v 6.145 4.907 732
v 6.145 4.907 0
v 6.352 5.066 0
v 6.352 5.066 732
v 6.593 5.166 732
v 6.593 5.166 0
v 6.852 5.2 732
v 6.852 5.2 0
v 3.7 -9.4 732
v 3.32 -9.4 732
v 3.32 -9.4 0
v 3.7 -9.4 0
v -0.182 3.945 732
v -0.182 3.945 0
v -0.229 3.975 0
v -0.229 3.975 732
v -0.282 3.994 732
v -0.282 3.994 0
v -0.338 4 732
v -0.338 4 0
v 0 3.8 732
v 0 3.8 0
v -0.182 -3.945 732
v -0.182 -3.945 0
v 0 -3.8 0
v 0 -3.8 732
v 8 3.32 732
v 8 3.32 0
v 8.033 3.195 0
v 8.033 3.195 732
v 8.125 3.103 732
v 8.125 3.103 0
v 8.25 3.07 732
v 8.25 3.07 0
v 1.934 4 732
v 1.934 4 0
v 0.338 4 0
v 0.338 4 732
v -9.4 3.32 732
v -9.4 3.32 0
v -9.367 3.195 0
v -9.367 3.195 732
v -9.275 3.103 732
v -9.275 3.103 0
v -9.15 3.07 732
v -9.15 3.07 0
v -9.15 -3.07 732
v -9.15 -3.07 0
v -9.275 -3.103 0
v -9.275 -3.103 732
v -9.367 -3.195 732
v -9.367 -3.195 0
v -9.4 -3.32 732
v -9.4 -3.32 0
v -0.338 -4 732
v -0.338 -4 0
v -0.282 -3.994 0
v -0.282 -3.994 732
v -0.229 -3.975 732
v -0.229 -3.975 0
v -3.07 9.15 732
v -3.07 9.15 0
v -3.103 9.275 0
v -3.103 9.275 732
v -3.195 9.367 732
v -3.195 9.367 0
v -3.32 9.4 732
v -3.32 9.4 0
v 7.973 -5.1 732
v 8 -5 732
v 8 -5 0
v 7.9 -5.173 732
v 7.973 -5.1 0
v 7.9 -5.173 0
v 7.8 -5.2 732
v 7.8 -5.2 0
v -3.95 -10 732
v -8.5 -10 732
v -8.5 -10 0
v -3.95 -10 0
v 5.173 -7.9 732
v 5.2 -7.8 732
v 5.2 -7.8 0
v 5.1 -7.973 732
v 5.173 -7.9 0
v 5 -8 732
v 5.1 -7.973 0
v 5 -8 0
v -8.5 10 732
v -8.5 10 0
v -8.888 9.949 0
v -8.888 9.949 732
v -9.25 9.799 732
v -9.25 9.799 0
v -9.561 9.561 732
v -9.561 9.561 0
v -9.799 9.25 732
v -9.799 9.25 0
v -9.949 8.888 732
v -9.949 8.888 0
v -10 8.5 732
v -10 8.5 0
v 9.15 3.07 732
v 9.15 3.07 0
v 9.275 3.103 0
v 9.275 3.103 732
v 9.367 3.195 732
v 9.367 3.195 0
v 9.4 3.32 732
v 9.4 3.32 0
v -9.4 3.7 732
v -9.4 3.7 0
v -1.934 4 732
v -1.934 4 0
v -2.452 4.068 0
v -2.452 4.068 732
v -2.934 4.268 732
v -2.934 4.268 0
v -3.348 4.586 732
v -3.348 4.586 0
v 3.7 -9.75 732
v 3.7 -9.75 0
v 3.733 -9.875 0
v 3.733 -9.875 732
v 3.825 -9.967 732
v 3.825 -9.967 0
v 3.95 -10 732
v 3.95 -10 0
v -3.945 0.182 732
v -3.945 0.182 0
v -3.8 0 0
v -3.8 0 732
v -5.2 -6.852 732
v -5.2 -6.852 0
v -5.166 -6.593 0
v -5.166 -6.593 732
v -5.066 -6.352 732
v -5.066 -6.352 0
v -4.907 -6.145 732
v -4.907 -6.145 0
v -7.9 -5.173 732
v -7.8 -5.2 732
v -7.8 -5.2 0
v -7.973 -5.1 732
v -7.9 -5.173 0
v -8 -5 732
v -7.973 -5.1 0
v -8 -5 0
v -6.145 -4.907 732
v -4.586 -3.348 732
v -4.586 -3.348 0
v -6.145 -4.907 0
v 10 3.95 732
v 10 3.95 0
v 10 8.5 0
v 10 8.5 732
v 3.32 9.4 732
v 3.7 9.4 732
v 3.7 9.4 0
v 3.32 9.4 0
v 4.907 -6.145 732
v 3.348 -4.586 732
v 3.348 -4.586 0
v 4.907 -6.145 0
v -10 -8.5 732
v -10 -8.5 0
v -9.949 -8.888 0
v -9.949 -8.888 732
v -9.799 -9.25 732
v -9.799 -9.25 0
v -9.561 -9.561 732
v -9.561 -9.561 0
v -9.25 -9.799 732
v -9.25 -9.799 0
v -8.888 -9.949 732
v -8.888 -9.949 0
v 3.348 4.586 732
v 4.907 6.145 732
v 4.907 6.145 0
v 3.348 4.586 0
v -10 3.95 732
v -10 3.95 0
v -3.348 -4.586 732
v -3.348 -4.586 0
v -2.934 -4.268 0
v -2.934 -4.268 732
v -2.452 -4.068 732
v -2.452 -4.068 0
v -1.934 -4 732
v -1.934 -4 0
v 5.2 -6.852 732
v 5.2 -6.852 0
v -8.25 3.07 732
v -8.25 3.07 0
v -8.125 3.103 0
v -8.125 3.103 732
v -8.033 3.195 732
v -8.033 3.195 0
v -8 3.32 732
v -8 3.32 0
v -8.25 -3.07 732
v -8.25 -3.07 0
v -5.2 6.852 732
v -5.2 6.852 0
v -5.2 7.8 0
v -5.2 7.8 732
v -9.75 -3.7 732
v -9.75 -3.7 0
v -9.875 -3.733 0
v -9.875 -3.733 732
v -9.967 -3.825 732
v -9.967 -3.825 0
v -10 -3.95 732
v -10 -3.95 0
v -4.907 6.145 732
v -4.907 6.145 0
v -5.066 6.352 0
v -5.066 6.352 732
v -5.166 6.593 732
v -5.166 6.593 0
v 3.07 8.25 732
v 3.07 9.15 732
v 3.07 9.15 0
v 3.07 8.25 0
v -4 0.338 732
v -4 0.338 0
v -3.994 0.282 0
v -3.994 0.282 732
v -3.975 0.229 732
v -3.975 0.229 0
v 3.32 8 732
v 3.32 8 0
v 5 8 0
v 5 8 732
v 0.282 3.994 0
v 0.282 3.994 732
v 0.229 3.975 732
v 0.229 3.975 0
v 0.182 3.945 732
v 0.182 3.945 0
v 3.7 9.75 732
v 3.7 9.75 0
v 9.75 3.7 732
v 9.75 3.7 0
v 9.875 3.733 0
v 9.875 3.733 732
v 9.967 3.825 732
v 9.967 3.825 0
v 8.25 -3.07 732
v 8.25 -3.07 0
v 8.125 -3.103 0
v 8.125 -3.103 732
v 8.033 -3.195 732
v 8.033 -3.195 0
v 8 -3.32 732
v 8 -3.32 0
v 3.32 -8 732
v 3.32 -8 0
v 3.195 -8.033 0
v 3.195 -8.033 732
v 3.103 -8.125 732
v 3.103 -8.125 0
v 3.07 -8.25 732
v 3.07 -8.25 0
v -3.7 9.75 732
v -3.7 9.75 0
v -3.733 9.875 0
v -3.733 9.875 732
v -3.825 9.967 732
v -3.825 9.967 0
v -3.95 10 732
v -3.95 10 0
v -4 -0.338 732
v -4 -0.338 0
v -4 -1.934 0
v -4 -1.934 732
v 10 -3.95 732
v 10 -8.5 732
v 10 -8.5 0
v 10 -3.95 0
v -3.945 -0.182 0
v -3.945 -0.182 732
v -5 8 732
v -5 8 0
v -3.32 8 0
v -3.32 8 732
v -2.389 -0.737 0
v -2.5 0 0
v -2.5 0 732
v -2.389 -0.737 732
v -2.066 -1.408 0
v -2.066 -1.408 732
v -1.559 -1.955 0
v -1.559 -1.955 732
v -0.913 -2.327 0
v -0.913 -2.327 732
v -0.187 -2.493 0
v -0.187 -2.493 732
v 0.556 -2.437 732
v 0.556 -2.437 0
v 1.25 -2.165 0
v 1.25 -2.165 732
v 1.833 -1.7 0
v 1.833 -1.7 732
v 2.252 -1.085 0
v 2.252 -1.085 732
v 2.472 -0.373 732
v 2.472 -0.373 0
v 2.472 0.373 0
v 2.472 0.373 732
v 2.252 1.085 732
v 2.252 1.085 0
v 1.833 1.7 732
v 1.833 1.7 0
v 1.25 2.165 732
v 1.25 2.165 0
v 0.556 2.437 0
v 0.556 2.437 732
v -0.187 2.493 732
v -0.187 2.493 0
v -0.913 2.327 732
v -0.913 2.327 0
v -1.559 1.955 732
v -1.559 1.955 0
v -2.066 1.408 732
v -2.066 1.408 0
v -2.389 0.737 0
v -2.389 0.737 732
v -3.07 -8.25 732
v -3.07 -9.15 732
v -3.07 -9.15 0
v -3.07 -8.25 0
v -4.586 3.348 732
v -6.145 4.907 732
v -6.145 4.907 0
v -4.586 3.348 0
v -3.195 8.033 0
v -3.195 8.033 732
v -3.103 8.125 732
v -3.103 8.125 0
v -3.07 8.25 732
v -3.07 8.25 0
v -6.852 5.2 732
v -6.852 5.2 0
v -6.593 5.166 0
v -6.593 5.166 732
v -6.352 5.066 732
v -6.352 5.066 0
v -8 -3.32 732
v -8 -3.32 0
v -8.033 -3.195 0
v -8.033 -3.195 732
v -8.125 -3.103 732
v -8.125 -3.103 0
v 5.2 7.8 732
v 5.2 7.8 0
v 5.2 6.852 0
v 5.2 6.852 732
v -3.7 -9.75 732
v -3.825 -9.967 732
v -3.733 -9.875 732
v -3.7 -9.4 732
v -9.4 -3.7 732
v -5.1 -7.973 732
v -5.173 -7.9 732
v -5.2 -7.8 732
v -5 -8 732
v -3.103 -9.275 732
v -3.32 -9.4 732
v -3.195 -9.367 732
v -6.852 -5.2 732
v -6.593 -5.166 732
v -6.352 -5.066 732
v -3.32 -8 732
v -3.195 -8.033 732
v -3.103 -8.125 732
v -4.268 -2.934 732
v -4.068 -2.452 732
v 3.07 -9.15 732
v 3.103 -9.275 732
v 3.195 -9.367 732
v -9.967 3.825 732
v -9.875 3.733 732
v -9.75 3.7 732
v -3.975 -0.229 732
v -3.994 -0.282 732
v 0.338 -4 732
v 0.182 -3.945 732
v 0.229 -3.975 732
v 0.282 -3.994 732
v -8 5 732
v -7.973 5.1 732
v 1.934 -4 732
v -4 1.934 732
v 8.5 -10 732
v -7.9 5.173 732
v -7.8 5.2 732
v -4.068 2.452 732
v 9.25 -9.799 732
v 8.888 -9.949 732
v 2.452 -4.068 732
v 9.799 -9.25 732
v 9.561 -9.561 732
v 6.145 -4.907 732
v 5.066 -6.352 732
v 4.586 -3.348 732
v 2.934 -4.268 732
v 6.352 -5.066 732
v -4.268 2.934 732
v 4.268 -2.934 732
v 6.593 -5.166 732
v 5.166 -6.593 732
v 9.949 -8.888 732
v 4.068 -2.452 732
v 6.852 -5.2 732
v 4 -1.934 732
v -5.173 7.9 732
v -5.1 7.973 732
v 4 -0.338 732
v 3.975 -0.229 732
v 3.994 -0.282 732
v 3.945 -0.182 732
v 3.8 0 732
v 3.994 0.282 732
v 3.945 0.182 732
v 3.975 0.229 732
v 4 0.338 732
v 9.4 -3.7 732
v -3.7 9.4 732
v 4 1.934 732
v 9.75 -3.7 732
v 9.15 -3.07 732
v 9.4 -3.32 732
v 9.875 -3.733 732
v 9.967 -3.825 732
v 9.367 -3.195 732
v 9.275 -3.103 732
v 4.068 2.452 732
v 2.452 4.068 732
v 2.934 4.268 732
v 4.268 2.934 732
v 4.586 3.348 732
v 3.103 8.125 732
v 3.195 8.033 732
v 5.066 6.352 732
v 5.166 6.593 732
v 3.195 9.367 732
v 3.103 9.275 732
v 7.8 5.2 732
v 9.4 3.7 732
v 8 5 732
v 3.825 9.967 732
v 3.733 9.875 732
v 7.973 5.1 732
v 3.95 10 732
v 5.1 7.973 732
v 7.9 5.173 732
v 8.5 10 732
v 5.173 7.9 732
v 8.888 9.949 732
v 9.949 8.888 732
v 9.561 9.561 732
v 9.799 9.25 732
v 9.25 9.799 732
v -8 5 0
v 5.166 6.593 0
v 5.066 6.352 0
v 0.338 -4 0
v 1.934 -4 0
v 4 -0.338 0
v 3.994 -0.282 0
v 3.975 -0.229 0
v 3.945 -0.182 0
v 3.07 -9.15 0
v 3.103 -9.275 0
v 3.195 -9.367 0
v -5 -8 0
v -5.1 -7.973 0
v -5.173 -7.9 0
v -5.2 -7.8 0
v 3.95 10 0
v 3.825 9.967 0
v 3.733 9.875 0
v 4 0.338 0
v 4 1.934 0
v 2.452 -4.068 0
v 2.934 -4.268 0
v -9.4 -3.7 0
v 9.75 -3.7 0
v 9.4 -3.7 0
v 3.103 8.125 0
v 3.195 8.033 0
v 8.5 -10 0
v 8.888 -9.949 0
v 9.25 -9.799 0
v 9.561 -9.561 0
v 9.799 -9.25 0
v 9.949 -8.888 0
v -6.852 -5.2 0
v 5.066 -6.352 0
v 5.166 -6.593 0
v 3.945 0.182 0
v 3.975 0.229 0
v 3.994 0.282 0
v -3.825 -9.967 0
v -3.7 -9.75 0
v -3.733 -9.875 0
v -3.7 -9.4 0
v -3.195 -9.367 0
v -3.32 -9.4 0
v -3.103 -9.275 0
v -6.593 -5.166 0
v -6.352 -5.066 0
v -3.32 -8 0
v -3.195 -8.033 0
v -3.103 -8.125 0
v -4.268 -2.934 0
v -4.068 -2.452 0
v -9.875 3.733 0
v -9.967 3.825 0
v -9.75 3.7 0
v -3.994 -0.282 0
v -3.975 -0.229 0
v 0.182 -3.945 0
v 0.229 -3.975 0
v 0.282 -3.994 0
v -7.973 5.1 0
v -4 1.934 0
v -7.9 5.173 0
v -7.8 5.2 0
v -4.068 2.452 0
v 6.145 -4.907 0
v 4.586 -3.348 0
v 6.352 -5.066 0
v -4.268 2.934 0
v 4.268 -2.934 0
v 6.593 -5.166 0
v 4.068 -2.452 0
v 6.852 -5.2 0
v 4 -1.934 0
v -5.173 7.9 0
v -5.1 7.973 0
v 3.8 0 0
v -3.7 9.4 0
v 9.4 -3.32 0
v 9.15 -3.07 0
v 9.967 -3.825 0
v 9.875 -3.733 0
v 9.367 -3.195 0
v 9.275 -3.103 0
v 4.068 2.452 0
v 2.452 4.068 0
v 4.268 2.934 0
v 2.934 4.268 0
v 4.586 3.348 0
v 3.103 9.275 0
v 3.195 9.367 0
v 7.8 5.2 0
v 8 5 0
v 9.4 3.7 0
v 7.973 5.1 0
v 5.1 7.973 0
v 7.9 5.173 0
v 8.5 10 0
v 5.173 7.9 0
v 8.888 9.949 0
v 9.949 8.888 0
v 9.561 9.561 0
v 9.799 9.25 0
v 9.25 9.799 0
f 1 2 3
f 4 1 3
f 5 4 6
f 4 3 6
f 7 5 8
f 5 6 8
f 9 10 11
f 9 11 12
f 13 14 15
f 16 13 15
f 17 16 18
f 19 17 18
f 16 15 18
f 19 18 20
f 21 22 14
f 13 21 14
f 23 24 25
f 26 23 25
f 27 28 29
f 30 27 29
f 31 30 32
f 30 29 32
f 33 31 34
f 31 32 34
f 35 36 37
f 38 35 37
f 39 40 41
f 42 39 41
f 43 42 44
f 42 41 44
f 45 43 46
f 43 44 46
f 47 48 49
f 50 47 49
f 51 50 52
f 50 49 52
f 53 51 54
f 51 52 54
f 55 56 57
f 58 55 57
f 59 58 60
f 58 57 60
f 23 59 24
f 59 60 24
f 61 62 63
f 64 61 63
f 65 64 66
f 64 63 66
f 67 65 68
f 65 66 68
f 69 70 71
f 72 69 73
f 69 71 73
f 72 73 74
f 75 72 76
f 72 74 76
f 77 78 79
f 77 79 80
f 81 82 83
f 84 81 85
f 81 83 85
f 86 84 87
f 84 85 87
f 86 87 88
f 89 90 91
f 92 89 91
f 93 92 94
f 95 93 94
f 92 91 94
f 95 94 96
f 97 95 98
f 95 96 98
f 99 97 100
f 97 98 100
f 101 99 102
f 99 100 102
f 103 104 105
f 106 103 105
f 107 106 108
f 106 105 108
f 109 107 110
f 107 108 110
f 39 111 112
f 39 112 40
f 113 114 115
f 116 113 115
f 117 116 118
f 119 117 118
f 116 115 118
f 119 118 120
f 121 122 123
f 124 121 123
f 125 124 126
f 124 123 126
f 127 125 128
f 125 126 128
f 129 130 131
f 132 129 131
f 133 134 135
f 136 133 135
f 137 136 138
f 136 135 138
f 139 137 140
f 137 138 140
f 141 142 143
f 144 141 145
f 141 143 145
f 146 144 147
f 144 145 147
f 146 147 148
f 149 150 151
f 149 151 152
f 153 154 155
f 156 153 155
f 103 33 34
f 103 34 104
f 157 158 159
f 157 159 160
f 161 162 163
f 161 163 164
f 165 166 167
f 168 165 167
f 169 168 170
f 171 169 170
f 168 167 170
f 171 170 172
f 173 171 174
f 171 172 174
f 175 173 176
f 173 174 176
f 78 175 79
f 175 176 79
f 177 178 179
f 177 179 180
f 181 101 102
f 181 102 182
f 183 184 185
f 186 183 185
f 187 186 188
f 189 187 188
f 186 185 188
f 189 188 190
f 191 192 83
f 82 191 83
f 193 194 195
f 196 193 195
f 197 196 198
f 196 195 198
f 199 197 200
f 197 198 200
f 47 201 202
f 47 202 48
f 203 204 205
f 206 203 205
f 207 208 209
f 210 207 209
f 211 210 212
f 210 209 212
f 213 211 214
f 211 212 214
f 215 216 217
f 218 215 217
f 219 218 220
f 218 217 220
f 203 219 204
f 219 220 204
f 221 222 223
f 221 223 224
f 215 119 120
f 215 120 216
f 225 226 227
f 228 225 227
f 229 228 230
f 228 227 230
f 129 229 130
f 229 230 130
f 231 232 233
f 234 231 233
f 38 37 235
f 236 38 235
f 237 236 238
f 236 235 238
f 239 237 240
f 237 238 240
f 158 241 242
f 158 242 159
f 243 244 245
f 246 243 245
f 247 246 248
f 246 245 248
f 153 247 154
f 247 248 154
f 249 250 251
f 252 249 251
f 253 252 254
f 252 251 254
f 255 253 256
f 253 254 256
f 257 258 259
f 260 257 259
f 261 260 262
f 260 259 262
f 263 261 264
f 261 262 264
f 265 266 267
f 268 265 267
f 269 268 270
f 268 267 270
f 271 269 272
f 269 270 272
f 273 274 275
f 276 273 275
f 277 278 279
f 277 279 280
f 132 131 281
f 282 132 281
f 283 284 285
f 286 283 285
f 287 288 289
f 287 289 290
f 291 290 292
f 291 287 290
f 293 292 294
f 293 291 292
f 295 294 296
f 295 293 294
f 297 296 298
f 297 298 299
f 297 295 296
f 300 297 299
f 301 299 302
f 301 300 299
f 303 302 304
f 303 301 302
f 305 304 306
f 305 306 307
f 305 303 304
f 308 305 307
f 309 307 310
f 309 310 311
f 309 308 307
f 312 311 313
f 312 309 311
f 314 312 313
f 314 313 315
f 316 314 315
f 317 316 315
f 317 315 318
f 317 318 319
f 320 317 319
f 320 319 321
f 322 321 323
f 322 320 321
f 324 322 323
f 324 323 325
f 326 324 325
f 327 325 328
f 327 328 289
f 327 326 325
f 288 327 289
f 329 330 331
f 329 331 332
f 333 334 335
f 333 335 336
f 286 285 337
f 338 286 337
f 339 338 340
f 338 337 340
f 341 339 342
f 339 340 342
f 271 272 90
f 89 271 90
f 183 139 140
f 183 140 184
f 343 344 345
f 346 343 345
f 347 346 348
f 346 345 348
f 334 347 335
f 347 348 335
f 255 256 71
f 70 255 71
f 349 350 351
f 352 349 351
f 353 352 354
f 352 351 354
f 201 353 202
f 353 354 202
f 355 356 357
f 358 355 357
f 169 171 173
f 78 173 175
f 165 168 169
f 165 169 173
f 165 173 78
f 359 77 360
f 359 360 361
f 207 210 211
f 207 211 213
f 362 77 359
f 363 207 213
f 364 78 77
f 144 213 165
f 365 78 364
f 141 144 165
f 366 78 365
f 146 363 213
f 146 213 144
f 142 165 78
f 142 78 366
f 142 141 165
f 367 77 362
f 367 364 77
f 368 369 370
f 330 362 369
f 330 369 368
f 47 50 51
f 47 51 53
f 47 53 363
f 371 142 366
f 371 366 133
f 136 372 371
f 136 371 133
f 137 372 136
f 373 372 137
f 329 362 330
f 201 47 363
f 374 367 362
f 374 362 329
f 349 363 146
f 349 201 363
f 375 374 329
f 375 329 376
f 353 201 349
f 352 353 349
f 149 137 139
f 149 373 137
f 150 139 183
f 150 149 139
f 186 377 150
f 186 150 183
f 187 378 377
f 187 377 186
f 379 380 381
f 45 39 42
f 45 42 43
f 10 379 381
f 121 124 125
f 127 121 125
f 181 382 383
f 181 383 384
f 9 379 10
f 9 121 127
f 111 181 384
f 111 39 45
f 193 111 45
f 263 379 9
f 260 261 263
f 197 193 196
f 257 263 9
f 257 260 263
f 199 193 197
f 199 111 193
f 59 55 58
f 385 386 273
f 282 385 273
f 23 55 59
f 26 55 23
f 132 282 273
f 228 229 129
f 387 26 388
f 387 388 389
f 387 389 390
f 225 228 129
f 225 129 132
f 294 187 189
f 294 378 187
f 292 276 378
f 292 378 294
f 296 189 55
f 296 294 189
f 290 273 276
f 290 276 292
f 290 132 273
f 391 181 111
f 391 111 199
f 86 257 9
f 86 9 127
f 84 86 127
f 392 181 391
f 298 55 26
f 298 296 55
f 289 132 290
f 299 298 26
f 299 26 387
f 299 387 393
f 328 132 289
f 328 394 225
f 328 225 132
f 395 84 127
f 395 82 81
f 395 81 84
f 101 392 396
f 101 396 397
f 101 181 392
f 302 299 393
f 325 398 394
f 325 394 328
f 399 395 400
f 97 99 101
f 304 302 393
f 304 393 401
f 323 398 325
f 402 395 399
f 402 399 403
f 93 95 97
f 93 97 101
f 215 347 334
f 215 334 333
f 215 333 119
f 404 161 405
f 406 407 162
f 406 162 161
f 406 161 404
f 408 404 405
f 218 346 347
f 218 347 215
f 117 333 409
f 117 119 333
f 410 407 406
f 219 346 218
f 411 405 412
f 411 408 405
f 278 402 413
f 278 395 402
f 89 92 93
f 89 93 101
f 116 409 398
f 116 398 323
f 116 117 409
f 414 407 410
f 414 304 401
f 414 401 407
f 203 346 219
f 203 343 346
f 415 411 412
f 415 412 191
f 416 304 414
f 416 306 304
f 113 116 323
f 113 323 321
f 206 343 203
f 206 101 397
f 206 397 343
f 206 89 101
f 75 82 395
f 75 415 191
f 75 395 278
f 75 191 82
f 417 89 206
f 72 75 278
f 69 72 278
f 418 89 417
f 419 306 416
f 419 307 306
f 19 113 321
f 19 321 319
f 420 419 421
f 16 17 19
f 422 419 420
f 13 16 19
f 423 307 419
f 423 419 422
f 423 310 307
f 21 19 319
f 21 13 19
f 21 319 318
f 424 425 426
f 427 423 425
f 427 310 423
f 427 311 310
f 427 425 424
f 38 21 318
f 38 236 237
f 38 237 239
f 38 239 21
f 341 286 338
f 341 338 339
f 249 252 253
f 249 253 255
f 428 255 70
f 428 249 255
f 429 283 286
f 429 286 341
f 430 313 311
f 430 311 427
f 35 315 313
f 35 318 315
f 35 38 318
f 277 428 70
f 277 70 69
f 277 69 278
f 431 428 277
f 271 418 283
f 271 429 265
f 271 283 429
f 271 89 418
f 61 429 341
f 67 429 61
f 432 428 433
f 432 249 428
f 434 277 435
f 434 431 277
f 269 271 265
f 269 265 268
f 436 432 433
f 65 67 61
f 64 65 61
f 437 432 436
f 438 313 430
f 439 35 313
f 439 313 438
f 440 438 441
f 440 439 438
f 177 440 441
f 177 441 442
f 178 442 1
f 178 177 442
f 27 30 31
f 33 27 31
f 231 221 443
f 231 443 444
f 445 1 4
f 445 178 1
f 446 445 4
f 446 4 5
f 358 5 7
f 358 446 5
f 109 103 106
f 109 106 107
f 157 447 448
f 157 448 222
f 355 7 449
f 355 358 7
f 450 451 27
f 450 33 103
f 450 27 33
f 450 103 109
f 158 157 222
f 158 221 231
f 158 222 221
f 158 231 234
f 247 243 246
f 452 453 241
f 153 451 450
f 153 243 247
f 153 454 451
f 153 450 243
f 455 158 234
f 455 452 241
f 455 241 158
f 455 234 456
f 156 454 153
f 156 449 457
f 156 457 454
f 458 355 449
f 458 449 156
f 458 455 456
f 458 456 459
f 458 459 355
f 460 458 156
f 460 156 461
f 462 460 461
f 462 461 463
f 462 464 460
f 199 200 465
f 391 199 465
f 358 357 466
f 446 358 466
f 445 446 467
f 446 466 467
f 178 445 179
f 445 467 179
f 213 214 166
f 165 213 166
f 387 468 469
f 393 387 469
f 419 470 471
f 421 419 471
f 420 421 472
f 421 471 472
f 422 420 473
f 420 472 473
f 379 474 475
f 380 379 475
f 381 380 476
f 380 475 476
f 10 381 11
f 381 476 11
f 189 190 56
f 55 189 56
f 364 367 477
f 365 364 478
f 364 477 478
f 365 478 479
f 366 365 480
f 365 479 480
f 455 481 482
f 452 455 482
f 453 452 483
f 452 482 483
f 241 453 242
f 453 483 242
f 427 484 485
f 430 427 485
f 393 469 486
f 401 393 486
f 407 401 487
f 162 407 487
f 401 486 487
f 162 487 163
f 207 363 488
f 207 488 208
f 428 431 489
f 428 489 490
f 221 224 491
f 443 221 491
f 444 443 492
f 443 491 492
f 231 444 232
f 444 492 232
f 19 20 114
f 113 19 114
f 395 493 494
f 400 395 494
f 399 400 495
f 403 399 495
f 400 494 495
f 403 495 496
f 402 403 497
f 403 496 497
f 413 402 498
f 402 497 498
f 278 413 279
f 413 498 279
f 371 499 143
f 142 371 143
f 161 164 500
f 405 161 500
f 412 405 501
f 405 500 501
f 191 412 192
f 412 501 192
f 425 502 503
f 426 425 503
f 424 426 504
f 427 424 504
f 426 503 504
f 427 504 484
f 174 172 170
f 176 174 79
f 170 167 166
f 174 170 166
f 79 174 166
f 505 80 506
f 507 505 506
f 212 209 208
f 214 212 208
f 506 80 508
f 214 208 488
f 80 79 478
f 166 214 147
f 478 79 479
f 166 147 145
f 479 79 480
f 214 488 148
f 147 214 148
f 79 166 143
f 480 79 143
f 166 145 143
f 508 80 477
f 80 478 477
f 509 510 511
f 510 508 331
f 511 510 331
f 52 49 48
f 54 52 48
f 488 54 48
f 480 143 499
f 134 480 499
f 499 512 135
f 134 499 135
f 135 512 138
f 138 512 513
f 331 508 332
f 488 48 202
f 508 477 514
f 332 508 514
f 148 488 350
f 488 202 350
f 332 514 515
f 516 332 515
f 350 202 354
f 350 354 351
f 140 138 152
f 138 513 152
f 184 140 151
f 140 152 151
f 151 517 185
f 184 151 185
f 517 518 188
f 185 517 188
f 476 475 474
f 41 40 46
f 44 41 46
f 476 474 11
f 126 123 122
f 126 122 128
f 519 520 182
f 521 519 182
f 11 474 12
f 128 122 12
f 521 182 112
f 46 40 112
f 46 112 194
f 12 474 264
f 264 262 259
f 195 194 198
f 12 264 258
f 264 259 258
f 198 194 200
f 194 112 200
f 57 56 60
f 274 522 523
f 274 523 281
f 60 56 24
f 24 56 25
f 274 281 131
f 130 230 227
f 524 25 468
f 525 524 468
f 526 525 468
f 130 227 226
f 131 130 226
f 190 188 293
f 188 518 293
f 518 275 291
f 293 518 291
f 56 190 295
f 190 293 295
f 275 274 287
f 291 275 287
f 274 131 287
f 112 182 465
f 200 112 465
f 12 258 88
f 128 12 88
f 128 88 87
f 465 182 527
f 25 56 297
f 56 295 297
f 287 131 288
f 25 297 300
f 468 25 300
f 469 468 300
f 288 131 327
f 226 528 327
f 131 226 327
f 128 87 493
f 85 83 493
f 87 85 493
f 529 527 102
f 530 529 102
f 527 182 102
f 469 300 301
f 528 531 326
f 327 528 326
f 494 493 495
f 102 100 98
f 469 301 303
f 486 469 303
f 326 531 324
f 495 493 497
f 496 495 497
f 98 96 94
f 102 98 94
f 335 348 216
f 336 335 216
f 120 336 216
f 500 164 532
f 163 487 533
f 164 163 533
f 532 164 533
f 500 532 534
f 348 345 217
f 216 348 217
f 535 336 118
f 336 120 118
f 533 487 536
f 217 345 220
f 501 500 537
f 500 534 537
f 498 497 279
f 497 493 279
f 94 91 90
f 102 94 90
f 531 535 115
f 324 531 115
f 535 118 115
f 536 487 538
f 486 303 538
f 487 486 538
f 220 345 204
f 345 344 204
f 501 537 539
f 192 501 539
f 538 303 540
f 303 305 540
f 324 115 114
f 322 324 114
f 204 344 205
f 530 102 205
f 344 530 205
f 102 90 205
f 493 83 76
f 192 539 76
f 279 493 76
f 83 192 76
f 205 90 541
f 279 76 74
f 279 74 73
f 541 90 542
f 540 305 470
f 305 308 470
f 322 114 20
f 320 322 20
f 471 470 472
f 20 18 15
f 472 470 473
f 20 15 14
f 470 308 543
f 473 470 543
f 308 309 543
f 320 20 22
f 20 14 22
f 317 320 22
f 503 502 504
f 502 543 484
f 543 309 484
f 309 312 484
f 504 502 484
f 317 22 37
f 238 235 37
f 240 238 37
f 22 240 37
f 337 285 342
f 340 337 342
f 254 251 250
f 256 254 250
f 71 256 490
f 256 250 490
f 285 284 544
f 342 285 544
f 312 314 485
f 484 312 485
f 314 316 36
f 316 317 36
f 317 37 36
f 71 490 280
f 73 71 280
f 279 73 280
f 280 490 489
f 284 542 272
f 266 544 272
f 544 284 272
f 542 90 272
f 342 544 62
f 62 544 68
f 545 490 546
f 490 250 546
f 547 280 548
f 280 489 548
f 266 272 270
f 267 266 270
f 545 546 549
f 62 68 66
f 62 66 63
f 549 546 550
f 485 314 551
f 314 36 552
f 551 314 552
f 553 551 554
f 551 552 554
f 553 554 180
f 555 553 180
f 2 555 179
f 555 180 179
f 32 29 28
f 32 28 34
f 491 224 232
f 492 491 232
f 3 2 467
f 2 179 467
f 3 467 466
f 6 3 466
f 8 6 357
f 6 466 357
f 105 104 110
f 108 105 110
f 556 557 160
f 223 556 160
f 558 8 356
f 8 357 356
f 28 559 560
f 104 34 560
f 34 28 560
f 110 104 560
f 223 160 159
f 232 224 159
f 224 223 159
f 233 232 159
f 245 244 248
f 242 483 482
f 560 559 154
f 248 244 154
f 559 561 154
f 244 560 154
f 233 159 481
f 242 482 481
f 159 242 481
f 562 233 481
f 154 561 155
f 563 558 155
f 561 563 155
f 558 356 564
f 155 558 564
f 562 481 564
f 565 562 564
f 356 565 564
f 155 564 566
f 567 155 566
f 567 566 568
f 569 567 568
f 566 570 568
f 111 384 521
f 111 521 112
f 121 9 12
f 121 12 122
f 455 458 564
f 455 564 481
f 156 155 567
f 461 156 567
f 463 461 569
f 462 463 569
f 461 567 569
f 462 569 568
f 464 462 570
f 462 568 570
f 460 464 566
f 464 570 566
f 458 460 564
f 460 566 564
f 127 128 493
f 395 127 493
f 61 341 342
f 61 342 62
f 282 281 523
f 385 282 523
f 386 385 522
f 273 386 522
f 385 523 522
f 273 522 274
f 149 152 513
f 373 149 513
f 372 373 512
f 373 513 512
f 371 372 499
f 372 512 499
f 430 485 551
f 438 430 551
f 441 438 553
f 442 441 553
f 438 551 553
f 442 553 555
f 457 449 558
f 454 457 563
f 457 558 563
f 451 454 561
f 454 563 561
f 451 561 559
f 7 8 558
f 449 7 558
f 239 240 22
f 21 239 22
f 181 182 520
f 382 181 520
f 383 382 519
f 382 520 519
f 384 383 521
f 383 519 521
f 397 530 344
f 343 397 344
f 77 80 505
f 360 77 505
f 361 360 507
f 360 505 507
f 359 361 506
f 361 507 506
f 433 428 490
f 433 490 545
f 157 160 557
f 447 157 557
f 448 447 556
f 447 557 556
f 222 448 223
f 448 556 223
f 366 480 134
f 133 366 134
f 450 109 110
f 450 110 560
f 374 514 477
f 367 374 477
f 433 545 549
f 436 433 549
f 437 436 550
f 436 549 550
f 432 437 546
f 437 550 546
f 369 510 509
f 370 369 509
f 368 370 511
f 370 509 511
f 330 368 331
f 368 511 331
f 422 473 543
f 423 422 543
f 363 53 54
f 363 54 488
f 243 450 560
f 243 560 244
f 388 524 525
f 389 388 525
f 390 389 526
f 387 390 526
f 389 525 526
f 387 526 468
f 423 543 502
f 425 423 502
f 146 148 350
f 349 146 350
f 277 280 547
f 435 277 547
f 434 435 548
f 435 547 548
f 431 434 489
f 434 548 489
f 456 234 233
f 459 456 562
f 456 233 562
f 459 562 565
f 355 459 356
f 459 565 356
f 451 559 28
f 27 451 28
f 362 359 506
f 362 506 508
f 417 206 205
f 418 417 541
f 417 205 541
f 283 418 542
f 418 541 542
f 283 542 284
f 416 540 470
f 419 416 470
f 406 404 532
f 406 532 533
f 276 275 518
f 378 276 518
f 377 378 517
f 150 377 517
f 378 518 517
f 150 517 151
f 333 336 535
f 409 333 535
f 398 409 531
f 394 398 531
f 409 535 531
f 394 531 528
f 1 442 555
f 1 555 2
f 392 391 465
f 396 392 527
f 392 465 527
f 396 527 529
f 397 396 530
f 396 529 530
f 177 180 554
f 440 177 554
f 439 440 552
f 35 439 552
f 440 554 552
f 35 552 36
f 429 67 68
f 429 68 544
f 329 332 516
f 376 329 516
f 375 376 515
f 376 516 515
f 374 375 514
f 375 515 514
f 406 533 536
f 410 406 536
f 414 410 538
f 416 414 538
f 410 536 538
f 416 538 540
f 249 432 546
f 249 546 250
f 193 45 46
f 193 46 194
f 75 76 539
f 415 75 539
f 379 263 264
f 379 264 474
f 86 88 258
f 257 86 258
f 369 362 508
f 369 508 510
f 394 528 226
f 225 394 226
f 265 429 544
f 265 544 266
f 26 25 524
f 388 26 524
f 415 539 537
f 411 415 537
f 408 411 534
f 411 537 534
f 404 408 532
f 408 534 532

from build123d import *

# Parameters (mm, degrees)
EXTRUDE_1_DEPTH = 732


with BuildPart() as part:
    # Эскиз1 → Бобышка-Вытянуть1 (new body)
    with BuildSketch(Plane.XY):
        with BuildLine():
            Line((-3.8, 0), (-3.945217202, -0.181521503))
            ThreePointArc((-3.945217202, -0.181521503), (-3.98590708, -0.254943529), (-4, -0.337695265))
            Line((-4, -0.337695265), (-4, -1.934136008))
            ThreePointArc((-4, -1.934136008), (-4.152240935, -2.699502873), (-4.585786438, -3.348349571))
            Line((-4.585786438, -3.348349571), (-6.144543648, -4.907106781))
            ThreePointArc((-6.144543648, -4.907106781), (-6.468966997, -5.123879533), (-6.851650429, -5.2))
            Line((-6.851650429, -5.2), (-7.8, -5.2))
            ThreePointArc((-7.8, -5.2), (-7.941421356, -5.141421356), (-8, -5))
            Line((-8, -5), (-8, -3.32))
            ThreePointArc((-8, -3.32), (-8.073223305, -3.143223305), (-8.25, -3.07))
            Line((-8.25, -3.07), (-9.15, -3.07))
            ThreePointArc((-9.15, -3.07), (-9.326776695, -3.143223305), (-9.4, -3.32))
            Line((-9.4, -3.32), (-9.4, -3.7))
            Line((-9.4, -3.7), (-9.75, -3.7))
            ThreePointArc((-9.75, -3.7), (-9.926776695, -3.773223305), (-10, -3.95))
            Line((-10, -3.95), (-10, -8.5))
            ThreePointArc((-10, -8.5), (-9.560660172, -9.560660172), (-8.5, -10))
            Line((-8.5, -10), (-3.95, -10))
            ThreePointArc((-3.95, -10), (-3.773223305, -9.926776695), (-3.7, -9.75))
            Line((-3.7, -9.75), (-3.7, -9.4))
            Line((-3.7, -9.4), (-3.32, -9.4))
            ThreePointArc((-3.32, -9.4), (-3.143223305, -9.326776695), (-3.07, -9.15))
            Line((-3.07, -9.15), (-3.07, -8.25))
            ThreePointArc((-3.07, -8.25), (-3.143223305, -8.073223305), (-3.32, -8))
            Line((-3.32, -8), (-5, -8))
            ThreePointArc((-5, -8), (-5.141421356, -7.941421356), (-5.2, -7.8))
            Line((-5.2, -7.8), (-5.2, -6.851650429))
            ThreePointArc((-5.2, -6.851650429), (-5.123879533, -6.468966997), (-4.907106781, -6.144543648))
            Line((-4.907106781, -6.144543648), (-3.348349571, -4.585786438))
            ThreePointArc((-3.348349571, -4.585786438), (-2.699502873, -4.152240935), (-1.934136008, -4))
            Line((-1.934136008, -4), (-0.337695265, -4))
            ThreePointArc((-0.337695265, -4), (-0.254943529, -3.98590708), (-0.181521503, -3.945217202))
            Line((-0.181521503, -3.945217202), (0, -3.8))
            Line((0, -3.8), (0.181521503, -3.945217202))
            ThreePointArc((0.181521503, -3.945217202), (0.254943529, -3.98590708), (0.337695265, -4))
            Line((0.337695265, -4), (1.934136008, -4))
            ThreePointArc((1.934136008, -4), (2.699502873, -4.152240935), (3.348349571, -4.585786438))
            Line((3.348349571, -4.585786438), (4.907106781, -6.144543648))
            ThreePointArc((4.907106781, -6.144543648), (5.123879533, -6.468966997), (5.2, -6.851650429))
            Line((5.2, -6.851650429), (5.2, -7.8))
            ThreePointArc((5.2, -7.8), (5.141421356, -7.941421356), (5, -8))
            Line((5, -8), (3.32, -8))
            ThreePointArc((3.32, -8), (3.143223305, -8.073223305), (3.07, -8.25))
            Line((3.07, -8.25), (3.07, -9.15))
            ThreePointArc((3.07, -9.15), (3.143223305, -9.326776695), (3.32, -9.4))
            Line((3.32, -9.4), (3.7, -9.4))
            Line((3.7, -9.4), (3.7, -9.75))
            ThreePointArc((3.7, -9.75), (3.773223305, -9.926776695), (3.95, -10))
            Line((3.95, -10), (8.5, -10))
            ThreePointArc((8.5, -10), (9.560660172, -9.560660172), (10, -8.5))
            Line((10, -8.5), (10, -3.95))
            ThreePointArc((10, -3.95), (9.926776695, -3.773223305), (9.75, -3.7))
            Line((9.75, -3.7), (9.4, -3.7))
            Line((9.4, -3.7), (9.4, -3.32))
            ThreePointArc((9.4, -3.32), (9.326776695, -3.143223305), (9.15, -3.07))
            Line((9.15, -3.07), (8.25, -3.07))
            ThreePointArc((8.25, -3.07), (8.073223305, -3.143223305), (8, -3.32))
            Line((8, -3.32), (8, -5))
            ThreePointArc((8, -5), (7.941421356, -5.141421356), (7.8, -5.2))
            Line((7.8, -5.2), (6.851650429, -5.2))
            ThreePointArc((6.851650429, -5.2), (6.468966997, -5.123879533), (6.144543648, -4.907106781))
            Line((6.144543648, -4.907106781), (4.585786438, -3.348349571))
            ThreePointArc((4.585786438, -3.348349571), (4.152240935, -2.699502873), (4, -1.934136008))
            Line((4, -1.934136008), (4, -0.337695265))
            ThreePointArc((4, -0.337695265), (3.98590708, -0.254943529), (3.945217202, -0.181521503))
            Line((3.945217202, -0.181521503), (3.8, 0))
            Line((3.8, 0), (3.945217202, 0.181521503))
            ThreePointArc((3.945217202, 0.181521503), (3.98590708, 0.254943529), (4, 0.337695265))
            Line((4, 0.337695265), (4, 1.934136008))
            ThreePointArc((4, 1.934136008), (4.152240935, 2.699502873), (4.585786438, 3.348349571))
            Line((4.585786438, 3.348349571), (6.144543648, 4.907106781))
            ThreePointArc((6.144543648, 4.907106781), (6.468966997, 5.123879533), (6.851650429, 5.2))
            Line((6.851650429, 5.2), (7.8, 5.2))
            ThreePointArc((7.8, 5.2), (7.941421356, 5.141421356), (8, 5))
            Line((8, 5), (8, 3.32))
            ThreePointArc((8, 3.32), (8.073223305, 3.143223305), (8.25, 3.07))
            Line((8.25, 3.07), (9.15, 3.07))
            ThreePointArc((9.15, 3.07), (9.326776695, 3.143223305), (9.4, 3.32))
            Line((9.4, 3.32), (9.4, 3.7))
            Line((9.4, 3.7), (9.75, 3.7))
            ThreePointArc((9.75, 3.7), (9.926776695, 3.773223305), (10, 3.95))
            Line((10, 3.95), (10, 8.5))
            ThreePointArc((10, 8.5), (9.560660172, 9.560660172), (8.5, 10))
            Line((8.5, 10), (3.95, 10))
            ThreePointArc((3.95, 10), (3.773223305, 9.926776695), (3.7, 9.75))
            Line((3.7, 9.75), (3.7, 9.4))
            Line((3.7, 9.4), (3.32, 9.4))
            ThreePointArc((3.32, 9.4), (3.143223305, 9.326776695), (3.07, 9.15))
            Line((3.07, 9.15), (3.07, 8.25))
            ThreePointArc((3.07, 8.25), (3.143223305, 8.073223305), (3.32, 8))
            Line((3.32, 8), (5, 8))
            ThreePointArc((5, 8), (5.141421356, 7.941421356), (5.2, 7.8))
            Line((5.2, 7.8), (5.2, 6.851650429))
            ThreePointArc((5.2, 6.851650429), (5.123879533, 6.468966997), (4.907106781, 6.144543648))
            Line((4.907106781, 6.144543648), (3.348349571, 4.585786438))
            ThreePointArc((3.348349571, 4.585786438), (2.699502873, 4.152240935), (1.934136008, 4))
            Line((1.934136008, 4), (0.337695265, 4))
            ThreePointArc((0.337695265, 4), (0.254943529, 3.98590708), (0.181521503, 3.945217202))
            Line((0.181521503, 3.945217202), (0, 3.8))
            Line((0, 3.8), (-0.181521503, 3.945217202))
            ThreePointArc((-0.181521503, 3.945217202), (-0.254943529, 3.98590708), (-0.337695265, 4))
            Line((-0.337695265, 4), (-1.934136008, 4))
            ThreePointArc((-1.934136008, 4), (-2.699502873, 4.152240935), (-3.348349571, 4.585786438))
            Line((-3.348349571, 4.585786438), (-4.907106781, 6.144543648))
            ThreePointArc((-4.907106781, 6.144543648), (-5.123879533, 6.468966997), (-5.2, 6.851650429))
            Line((-5.2, 6.851650429), (-5.2, 7.8))
            ThreePointArc((-5.2, 7.8), (-5.141421356, 7.941421356), (-5, 8))
            Line((-5, 8), (-3.32, 8))
            ThreePointArc((-3.32, 8), (-3.143223305, 8.073223305), (-3.07, 8.25))
            Line((-3.07, 8.25), (-3.07, 9.15))
            ThreePointArc((-3.07, 9.15), (-3.143223305, 9.326776695), (-3.32, 9.4))
            Line((-3.32, 9.4), (-3.7, 9.4))
            Line((-3.7, 9.4), (-3.7, 9.75))
            ThreePointArc((-3.7, 9.75), (-3.773223305, 9.926776695), (-3.95, 10))
            Line((-3.95, 10), (-8.5, 10))
            ThreePointArc((-8.5, 10), (-9.560660172, 9.560660172), (-10, 8.5))
            Line((-10, 8.5), (-10, 3.95))
            ThreePointArc((-10, 3.95), (-9.926776695, 3.773223305), (-9.75, 3.7))
            Line((-9.75, 3.7), (-9.4, 3.7))
            Line((-9.4, 3.7), (-9.4, 3.32))
            ThreePointArc((-9.4, 3.32), (-9.326776695, 3.143223305), (-9.15, 3.07))
            Line((-9.15, 3.07), (-8.25, 3.07))
            ThreePointArc((-8.25, 3.07), (-8.073223305, 3.143223305), (-8, 3.32))
            Line((-8, 3.32), (-8, 5))
            ThreePointArc((-8, 5), (-7.941421356, 5.141421356), (-7.8, 5.2))
            Line((-7.8, 5.2), (-6.851650429, 5.2))
            ThreePointArc((-6.851650429, 5.2), (-6.468966997, 5.123879533), (-6.144543648, 4.907106781))
            Line((-6.144543648, 4.907106781), (-4.585786438, 3.348349571))
            ThreePointArc((-4.585786438, 3.348349571), (-4.152240935, 2.699502873), (-4, 1.934136008))
            Line((-4, 1.934136008), (-4, 0.337695265))
            ThreePointArc((-4, 0.337695265), (-3.98590708, 0.254943529), (-3.945217202, 0.181521503))
            Line((-3.945217202, 0.181521503), (-3.8, 0))
        make_face()
        with BuildLine():
            ThreePointArc((2.5, 0), (0, 2.5), (-2.5, 0))
            ThreePointArc((-2.5, 0), (0, -2.5), (2.5, 0))
        make_face(mode=Mode.SUBTRACT)
    extrude(amount=EXTRUDE_1_DEPTH)


solid = part.part
